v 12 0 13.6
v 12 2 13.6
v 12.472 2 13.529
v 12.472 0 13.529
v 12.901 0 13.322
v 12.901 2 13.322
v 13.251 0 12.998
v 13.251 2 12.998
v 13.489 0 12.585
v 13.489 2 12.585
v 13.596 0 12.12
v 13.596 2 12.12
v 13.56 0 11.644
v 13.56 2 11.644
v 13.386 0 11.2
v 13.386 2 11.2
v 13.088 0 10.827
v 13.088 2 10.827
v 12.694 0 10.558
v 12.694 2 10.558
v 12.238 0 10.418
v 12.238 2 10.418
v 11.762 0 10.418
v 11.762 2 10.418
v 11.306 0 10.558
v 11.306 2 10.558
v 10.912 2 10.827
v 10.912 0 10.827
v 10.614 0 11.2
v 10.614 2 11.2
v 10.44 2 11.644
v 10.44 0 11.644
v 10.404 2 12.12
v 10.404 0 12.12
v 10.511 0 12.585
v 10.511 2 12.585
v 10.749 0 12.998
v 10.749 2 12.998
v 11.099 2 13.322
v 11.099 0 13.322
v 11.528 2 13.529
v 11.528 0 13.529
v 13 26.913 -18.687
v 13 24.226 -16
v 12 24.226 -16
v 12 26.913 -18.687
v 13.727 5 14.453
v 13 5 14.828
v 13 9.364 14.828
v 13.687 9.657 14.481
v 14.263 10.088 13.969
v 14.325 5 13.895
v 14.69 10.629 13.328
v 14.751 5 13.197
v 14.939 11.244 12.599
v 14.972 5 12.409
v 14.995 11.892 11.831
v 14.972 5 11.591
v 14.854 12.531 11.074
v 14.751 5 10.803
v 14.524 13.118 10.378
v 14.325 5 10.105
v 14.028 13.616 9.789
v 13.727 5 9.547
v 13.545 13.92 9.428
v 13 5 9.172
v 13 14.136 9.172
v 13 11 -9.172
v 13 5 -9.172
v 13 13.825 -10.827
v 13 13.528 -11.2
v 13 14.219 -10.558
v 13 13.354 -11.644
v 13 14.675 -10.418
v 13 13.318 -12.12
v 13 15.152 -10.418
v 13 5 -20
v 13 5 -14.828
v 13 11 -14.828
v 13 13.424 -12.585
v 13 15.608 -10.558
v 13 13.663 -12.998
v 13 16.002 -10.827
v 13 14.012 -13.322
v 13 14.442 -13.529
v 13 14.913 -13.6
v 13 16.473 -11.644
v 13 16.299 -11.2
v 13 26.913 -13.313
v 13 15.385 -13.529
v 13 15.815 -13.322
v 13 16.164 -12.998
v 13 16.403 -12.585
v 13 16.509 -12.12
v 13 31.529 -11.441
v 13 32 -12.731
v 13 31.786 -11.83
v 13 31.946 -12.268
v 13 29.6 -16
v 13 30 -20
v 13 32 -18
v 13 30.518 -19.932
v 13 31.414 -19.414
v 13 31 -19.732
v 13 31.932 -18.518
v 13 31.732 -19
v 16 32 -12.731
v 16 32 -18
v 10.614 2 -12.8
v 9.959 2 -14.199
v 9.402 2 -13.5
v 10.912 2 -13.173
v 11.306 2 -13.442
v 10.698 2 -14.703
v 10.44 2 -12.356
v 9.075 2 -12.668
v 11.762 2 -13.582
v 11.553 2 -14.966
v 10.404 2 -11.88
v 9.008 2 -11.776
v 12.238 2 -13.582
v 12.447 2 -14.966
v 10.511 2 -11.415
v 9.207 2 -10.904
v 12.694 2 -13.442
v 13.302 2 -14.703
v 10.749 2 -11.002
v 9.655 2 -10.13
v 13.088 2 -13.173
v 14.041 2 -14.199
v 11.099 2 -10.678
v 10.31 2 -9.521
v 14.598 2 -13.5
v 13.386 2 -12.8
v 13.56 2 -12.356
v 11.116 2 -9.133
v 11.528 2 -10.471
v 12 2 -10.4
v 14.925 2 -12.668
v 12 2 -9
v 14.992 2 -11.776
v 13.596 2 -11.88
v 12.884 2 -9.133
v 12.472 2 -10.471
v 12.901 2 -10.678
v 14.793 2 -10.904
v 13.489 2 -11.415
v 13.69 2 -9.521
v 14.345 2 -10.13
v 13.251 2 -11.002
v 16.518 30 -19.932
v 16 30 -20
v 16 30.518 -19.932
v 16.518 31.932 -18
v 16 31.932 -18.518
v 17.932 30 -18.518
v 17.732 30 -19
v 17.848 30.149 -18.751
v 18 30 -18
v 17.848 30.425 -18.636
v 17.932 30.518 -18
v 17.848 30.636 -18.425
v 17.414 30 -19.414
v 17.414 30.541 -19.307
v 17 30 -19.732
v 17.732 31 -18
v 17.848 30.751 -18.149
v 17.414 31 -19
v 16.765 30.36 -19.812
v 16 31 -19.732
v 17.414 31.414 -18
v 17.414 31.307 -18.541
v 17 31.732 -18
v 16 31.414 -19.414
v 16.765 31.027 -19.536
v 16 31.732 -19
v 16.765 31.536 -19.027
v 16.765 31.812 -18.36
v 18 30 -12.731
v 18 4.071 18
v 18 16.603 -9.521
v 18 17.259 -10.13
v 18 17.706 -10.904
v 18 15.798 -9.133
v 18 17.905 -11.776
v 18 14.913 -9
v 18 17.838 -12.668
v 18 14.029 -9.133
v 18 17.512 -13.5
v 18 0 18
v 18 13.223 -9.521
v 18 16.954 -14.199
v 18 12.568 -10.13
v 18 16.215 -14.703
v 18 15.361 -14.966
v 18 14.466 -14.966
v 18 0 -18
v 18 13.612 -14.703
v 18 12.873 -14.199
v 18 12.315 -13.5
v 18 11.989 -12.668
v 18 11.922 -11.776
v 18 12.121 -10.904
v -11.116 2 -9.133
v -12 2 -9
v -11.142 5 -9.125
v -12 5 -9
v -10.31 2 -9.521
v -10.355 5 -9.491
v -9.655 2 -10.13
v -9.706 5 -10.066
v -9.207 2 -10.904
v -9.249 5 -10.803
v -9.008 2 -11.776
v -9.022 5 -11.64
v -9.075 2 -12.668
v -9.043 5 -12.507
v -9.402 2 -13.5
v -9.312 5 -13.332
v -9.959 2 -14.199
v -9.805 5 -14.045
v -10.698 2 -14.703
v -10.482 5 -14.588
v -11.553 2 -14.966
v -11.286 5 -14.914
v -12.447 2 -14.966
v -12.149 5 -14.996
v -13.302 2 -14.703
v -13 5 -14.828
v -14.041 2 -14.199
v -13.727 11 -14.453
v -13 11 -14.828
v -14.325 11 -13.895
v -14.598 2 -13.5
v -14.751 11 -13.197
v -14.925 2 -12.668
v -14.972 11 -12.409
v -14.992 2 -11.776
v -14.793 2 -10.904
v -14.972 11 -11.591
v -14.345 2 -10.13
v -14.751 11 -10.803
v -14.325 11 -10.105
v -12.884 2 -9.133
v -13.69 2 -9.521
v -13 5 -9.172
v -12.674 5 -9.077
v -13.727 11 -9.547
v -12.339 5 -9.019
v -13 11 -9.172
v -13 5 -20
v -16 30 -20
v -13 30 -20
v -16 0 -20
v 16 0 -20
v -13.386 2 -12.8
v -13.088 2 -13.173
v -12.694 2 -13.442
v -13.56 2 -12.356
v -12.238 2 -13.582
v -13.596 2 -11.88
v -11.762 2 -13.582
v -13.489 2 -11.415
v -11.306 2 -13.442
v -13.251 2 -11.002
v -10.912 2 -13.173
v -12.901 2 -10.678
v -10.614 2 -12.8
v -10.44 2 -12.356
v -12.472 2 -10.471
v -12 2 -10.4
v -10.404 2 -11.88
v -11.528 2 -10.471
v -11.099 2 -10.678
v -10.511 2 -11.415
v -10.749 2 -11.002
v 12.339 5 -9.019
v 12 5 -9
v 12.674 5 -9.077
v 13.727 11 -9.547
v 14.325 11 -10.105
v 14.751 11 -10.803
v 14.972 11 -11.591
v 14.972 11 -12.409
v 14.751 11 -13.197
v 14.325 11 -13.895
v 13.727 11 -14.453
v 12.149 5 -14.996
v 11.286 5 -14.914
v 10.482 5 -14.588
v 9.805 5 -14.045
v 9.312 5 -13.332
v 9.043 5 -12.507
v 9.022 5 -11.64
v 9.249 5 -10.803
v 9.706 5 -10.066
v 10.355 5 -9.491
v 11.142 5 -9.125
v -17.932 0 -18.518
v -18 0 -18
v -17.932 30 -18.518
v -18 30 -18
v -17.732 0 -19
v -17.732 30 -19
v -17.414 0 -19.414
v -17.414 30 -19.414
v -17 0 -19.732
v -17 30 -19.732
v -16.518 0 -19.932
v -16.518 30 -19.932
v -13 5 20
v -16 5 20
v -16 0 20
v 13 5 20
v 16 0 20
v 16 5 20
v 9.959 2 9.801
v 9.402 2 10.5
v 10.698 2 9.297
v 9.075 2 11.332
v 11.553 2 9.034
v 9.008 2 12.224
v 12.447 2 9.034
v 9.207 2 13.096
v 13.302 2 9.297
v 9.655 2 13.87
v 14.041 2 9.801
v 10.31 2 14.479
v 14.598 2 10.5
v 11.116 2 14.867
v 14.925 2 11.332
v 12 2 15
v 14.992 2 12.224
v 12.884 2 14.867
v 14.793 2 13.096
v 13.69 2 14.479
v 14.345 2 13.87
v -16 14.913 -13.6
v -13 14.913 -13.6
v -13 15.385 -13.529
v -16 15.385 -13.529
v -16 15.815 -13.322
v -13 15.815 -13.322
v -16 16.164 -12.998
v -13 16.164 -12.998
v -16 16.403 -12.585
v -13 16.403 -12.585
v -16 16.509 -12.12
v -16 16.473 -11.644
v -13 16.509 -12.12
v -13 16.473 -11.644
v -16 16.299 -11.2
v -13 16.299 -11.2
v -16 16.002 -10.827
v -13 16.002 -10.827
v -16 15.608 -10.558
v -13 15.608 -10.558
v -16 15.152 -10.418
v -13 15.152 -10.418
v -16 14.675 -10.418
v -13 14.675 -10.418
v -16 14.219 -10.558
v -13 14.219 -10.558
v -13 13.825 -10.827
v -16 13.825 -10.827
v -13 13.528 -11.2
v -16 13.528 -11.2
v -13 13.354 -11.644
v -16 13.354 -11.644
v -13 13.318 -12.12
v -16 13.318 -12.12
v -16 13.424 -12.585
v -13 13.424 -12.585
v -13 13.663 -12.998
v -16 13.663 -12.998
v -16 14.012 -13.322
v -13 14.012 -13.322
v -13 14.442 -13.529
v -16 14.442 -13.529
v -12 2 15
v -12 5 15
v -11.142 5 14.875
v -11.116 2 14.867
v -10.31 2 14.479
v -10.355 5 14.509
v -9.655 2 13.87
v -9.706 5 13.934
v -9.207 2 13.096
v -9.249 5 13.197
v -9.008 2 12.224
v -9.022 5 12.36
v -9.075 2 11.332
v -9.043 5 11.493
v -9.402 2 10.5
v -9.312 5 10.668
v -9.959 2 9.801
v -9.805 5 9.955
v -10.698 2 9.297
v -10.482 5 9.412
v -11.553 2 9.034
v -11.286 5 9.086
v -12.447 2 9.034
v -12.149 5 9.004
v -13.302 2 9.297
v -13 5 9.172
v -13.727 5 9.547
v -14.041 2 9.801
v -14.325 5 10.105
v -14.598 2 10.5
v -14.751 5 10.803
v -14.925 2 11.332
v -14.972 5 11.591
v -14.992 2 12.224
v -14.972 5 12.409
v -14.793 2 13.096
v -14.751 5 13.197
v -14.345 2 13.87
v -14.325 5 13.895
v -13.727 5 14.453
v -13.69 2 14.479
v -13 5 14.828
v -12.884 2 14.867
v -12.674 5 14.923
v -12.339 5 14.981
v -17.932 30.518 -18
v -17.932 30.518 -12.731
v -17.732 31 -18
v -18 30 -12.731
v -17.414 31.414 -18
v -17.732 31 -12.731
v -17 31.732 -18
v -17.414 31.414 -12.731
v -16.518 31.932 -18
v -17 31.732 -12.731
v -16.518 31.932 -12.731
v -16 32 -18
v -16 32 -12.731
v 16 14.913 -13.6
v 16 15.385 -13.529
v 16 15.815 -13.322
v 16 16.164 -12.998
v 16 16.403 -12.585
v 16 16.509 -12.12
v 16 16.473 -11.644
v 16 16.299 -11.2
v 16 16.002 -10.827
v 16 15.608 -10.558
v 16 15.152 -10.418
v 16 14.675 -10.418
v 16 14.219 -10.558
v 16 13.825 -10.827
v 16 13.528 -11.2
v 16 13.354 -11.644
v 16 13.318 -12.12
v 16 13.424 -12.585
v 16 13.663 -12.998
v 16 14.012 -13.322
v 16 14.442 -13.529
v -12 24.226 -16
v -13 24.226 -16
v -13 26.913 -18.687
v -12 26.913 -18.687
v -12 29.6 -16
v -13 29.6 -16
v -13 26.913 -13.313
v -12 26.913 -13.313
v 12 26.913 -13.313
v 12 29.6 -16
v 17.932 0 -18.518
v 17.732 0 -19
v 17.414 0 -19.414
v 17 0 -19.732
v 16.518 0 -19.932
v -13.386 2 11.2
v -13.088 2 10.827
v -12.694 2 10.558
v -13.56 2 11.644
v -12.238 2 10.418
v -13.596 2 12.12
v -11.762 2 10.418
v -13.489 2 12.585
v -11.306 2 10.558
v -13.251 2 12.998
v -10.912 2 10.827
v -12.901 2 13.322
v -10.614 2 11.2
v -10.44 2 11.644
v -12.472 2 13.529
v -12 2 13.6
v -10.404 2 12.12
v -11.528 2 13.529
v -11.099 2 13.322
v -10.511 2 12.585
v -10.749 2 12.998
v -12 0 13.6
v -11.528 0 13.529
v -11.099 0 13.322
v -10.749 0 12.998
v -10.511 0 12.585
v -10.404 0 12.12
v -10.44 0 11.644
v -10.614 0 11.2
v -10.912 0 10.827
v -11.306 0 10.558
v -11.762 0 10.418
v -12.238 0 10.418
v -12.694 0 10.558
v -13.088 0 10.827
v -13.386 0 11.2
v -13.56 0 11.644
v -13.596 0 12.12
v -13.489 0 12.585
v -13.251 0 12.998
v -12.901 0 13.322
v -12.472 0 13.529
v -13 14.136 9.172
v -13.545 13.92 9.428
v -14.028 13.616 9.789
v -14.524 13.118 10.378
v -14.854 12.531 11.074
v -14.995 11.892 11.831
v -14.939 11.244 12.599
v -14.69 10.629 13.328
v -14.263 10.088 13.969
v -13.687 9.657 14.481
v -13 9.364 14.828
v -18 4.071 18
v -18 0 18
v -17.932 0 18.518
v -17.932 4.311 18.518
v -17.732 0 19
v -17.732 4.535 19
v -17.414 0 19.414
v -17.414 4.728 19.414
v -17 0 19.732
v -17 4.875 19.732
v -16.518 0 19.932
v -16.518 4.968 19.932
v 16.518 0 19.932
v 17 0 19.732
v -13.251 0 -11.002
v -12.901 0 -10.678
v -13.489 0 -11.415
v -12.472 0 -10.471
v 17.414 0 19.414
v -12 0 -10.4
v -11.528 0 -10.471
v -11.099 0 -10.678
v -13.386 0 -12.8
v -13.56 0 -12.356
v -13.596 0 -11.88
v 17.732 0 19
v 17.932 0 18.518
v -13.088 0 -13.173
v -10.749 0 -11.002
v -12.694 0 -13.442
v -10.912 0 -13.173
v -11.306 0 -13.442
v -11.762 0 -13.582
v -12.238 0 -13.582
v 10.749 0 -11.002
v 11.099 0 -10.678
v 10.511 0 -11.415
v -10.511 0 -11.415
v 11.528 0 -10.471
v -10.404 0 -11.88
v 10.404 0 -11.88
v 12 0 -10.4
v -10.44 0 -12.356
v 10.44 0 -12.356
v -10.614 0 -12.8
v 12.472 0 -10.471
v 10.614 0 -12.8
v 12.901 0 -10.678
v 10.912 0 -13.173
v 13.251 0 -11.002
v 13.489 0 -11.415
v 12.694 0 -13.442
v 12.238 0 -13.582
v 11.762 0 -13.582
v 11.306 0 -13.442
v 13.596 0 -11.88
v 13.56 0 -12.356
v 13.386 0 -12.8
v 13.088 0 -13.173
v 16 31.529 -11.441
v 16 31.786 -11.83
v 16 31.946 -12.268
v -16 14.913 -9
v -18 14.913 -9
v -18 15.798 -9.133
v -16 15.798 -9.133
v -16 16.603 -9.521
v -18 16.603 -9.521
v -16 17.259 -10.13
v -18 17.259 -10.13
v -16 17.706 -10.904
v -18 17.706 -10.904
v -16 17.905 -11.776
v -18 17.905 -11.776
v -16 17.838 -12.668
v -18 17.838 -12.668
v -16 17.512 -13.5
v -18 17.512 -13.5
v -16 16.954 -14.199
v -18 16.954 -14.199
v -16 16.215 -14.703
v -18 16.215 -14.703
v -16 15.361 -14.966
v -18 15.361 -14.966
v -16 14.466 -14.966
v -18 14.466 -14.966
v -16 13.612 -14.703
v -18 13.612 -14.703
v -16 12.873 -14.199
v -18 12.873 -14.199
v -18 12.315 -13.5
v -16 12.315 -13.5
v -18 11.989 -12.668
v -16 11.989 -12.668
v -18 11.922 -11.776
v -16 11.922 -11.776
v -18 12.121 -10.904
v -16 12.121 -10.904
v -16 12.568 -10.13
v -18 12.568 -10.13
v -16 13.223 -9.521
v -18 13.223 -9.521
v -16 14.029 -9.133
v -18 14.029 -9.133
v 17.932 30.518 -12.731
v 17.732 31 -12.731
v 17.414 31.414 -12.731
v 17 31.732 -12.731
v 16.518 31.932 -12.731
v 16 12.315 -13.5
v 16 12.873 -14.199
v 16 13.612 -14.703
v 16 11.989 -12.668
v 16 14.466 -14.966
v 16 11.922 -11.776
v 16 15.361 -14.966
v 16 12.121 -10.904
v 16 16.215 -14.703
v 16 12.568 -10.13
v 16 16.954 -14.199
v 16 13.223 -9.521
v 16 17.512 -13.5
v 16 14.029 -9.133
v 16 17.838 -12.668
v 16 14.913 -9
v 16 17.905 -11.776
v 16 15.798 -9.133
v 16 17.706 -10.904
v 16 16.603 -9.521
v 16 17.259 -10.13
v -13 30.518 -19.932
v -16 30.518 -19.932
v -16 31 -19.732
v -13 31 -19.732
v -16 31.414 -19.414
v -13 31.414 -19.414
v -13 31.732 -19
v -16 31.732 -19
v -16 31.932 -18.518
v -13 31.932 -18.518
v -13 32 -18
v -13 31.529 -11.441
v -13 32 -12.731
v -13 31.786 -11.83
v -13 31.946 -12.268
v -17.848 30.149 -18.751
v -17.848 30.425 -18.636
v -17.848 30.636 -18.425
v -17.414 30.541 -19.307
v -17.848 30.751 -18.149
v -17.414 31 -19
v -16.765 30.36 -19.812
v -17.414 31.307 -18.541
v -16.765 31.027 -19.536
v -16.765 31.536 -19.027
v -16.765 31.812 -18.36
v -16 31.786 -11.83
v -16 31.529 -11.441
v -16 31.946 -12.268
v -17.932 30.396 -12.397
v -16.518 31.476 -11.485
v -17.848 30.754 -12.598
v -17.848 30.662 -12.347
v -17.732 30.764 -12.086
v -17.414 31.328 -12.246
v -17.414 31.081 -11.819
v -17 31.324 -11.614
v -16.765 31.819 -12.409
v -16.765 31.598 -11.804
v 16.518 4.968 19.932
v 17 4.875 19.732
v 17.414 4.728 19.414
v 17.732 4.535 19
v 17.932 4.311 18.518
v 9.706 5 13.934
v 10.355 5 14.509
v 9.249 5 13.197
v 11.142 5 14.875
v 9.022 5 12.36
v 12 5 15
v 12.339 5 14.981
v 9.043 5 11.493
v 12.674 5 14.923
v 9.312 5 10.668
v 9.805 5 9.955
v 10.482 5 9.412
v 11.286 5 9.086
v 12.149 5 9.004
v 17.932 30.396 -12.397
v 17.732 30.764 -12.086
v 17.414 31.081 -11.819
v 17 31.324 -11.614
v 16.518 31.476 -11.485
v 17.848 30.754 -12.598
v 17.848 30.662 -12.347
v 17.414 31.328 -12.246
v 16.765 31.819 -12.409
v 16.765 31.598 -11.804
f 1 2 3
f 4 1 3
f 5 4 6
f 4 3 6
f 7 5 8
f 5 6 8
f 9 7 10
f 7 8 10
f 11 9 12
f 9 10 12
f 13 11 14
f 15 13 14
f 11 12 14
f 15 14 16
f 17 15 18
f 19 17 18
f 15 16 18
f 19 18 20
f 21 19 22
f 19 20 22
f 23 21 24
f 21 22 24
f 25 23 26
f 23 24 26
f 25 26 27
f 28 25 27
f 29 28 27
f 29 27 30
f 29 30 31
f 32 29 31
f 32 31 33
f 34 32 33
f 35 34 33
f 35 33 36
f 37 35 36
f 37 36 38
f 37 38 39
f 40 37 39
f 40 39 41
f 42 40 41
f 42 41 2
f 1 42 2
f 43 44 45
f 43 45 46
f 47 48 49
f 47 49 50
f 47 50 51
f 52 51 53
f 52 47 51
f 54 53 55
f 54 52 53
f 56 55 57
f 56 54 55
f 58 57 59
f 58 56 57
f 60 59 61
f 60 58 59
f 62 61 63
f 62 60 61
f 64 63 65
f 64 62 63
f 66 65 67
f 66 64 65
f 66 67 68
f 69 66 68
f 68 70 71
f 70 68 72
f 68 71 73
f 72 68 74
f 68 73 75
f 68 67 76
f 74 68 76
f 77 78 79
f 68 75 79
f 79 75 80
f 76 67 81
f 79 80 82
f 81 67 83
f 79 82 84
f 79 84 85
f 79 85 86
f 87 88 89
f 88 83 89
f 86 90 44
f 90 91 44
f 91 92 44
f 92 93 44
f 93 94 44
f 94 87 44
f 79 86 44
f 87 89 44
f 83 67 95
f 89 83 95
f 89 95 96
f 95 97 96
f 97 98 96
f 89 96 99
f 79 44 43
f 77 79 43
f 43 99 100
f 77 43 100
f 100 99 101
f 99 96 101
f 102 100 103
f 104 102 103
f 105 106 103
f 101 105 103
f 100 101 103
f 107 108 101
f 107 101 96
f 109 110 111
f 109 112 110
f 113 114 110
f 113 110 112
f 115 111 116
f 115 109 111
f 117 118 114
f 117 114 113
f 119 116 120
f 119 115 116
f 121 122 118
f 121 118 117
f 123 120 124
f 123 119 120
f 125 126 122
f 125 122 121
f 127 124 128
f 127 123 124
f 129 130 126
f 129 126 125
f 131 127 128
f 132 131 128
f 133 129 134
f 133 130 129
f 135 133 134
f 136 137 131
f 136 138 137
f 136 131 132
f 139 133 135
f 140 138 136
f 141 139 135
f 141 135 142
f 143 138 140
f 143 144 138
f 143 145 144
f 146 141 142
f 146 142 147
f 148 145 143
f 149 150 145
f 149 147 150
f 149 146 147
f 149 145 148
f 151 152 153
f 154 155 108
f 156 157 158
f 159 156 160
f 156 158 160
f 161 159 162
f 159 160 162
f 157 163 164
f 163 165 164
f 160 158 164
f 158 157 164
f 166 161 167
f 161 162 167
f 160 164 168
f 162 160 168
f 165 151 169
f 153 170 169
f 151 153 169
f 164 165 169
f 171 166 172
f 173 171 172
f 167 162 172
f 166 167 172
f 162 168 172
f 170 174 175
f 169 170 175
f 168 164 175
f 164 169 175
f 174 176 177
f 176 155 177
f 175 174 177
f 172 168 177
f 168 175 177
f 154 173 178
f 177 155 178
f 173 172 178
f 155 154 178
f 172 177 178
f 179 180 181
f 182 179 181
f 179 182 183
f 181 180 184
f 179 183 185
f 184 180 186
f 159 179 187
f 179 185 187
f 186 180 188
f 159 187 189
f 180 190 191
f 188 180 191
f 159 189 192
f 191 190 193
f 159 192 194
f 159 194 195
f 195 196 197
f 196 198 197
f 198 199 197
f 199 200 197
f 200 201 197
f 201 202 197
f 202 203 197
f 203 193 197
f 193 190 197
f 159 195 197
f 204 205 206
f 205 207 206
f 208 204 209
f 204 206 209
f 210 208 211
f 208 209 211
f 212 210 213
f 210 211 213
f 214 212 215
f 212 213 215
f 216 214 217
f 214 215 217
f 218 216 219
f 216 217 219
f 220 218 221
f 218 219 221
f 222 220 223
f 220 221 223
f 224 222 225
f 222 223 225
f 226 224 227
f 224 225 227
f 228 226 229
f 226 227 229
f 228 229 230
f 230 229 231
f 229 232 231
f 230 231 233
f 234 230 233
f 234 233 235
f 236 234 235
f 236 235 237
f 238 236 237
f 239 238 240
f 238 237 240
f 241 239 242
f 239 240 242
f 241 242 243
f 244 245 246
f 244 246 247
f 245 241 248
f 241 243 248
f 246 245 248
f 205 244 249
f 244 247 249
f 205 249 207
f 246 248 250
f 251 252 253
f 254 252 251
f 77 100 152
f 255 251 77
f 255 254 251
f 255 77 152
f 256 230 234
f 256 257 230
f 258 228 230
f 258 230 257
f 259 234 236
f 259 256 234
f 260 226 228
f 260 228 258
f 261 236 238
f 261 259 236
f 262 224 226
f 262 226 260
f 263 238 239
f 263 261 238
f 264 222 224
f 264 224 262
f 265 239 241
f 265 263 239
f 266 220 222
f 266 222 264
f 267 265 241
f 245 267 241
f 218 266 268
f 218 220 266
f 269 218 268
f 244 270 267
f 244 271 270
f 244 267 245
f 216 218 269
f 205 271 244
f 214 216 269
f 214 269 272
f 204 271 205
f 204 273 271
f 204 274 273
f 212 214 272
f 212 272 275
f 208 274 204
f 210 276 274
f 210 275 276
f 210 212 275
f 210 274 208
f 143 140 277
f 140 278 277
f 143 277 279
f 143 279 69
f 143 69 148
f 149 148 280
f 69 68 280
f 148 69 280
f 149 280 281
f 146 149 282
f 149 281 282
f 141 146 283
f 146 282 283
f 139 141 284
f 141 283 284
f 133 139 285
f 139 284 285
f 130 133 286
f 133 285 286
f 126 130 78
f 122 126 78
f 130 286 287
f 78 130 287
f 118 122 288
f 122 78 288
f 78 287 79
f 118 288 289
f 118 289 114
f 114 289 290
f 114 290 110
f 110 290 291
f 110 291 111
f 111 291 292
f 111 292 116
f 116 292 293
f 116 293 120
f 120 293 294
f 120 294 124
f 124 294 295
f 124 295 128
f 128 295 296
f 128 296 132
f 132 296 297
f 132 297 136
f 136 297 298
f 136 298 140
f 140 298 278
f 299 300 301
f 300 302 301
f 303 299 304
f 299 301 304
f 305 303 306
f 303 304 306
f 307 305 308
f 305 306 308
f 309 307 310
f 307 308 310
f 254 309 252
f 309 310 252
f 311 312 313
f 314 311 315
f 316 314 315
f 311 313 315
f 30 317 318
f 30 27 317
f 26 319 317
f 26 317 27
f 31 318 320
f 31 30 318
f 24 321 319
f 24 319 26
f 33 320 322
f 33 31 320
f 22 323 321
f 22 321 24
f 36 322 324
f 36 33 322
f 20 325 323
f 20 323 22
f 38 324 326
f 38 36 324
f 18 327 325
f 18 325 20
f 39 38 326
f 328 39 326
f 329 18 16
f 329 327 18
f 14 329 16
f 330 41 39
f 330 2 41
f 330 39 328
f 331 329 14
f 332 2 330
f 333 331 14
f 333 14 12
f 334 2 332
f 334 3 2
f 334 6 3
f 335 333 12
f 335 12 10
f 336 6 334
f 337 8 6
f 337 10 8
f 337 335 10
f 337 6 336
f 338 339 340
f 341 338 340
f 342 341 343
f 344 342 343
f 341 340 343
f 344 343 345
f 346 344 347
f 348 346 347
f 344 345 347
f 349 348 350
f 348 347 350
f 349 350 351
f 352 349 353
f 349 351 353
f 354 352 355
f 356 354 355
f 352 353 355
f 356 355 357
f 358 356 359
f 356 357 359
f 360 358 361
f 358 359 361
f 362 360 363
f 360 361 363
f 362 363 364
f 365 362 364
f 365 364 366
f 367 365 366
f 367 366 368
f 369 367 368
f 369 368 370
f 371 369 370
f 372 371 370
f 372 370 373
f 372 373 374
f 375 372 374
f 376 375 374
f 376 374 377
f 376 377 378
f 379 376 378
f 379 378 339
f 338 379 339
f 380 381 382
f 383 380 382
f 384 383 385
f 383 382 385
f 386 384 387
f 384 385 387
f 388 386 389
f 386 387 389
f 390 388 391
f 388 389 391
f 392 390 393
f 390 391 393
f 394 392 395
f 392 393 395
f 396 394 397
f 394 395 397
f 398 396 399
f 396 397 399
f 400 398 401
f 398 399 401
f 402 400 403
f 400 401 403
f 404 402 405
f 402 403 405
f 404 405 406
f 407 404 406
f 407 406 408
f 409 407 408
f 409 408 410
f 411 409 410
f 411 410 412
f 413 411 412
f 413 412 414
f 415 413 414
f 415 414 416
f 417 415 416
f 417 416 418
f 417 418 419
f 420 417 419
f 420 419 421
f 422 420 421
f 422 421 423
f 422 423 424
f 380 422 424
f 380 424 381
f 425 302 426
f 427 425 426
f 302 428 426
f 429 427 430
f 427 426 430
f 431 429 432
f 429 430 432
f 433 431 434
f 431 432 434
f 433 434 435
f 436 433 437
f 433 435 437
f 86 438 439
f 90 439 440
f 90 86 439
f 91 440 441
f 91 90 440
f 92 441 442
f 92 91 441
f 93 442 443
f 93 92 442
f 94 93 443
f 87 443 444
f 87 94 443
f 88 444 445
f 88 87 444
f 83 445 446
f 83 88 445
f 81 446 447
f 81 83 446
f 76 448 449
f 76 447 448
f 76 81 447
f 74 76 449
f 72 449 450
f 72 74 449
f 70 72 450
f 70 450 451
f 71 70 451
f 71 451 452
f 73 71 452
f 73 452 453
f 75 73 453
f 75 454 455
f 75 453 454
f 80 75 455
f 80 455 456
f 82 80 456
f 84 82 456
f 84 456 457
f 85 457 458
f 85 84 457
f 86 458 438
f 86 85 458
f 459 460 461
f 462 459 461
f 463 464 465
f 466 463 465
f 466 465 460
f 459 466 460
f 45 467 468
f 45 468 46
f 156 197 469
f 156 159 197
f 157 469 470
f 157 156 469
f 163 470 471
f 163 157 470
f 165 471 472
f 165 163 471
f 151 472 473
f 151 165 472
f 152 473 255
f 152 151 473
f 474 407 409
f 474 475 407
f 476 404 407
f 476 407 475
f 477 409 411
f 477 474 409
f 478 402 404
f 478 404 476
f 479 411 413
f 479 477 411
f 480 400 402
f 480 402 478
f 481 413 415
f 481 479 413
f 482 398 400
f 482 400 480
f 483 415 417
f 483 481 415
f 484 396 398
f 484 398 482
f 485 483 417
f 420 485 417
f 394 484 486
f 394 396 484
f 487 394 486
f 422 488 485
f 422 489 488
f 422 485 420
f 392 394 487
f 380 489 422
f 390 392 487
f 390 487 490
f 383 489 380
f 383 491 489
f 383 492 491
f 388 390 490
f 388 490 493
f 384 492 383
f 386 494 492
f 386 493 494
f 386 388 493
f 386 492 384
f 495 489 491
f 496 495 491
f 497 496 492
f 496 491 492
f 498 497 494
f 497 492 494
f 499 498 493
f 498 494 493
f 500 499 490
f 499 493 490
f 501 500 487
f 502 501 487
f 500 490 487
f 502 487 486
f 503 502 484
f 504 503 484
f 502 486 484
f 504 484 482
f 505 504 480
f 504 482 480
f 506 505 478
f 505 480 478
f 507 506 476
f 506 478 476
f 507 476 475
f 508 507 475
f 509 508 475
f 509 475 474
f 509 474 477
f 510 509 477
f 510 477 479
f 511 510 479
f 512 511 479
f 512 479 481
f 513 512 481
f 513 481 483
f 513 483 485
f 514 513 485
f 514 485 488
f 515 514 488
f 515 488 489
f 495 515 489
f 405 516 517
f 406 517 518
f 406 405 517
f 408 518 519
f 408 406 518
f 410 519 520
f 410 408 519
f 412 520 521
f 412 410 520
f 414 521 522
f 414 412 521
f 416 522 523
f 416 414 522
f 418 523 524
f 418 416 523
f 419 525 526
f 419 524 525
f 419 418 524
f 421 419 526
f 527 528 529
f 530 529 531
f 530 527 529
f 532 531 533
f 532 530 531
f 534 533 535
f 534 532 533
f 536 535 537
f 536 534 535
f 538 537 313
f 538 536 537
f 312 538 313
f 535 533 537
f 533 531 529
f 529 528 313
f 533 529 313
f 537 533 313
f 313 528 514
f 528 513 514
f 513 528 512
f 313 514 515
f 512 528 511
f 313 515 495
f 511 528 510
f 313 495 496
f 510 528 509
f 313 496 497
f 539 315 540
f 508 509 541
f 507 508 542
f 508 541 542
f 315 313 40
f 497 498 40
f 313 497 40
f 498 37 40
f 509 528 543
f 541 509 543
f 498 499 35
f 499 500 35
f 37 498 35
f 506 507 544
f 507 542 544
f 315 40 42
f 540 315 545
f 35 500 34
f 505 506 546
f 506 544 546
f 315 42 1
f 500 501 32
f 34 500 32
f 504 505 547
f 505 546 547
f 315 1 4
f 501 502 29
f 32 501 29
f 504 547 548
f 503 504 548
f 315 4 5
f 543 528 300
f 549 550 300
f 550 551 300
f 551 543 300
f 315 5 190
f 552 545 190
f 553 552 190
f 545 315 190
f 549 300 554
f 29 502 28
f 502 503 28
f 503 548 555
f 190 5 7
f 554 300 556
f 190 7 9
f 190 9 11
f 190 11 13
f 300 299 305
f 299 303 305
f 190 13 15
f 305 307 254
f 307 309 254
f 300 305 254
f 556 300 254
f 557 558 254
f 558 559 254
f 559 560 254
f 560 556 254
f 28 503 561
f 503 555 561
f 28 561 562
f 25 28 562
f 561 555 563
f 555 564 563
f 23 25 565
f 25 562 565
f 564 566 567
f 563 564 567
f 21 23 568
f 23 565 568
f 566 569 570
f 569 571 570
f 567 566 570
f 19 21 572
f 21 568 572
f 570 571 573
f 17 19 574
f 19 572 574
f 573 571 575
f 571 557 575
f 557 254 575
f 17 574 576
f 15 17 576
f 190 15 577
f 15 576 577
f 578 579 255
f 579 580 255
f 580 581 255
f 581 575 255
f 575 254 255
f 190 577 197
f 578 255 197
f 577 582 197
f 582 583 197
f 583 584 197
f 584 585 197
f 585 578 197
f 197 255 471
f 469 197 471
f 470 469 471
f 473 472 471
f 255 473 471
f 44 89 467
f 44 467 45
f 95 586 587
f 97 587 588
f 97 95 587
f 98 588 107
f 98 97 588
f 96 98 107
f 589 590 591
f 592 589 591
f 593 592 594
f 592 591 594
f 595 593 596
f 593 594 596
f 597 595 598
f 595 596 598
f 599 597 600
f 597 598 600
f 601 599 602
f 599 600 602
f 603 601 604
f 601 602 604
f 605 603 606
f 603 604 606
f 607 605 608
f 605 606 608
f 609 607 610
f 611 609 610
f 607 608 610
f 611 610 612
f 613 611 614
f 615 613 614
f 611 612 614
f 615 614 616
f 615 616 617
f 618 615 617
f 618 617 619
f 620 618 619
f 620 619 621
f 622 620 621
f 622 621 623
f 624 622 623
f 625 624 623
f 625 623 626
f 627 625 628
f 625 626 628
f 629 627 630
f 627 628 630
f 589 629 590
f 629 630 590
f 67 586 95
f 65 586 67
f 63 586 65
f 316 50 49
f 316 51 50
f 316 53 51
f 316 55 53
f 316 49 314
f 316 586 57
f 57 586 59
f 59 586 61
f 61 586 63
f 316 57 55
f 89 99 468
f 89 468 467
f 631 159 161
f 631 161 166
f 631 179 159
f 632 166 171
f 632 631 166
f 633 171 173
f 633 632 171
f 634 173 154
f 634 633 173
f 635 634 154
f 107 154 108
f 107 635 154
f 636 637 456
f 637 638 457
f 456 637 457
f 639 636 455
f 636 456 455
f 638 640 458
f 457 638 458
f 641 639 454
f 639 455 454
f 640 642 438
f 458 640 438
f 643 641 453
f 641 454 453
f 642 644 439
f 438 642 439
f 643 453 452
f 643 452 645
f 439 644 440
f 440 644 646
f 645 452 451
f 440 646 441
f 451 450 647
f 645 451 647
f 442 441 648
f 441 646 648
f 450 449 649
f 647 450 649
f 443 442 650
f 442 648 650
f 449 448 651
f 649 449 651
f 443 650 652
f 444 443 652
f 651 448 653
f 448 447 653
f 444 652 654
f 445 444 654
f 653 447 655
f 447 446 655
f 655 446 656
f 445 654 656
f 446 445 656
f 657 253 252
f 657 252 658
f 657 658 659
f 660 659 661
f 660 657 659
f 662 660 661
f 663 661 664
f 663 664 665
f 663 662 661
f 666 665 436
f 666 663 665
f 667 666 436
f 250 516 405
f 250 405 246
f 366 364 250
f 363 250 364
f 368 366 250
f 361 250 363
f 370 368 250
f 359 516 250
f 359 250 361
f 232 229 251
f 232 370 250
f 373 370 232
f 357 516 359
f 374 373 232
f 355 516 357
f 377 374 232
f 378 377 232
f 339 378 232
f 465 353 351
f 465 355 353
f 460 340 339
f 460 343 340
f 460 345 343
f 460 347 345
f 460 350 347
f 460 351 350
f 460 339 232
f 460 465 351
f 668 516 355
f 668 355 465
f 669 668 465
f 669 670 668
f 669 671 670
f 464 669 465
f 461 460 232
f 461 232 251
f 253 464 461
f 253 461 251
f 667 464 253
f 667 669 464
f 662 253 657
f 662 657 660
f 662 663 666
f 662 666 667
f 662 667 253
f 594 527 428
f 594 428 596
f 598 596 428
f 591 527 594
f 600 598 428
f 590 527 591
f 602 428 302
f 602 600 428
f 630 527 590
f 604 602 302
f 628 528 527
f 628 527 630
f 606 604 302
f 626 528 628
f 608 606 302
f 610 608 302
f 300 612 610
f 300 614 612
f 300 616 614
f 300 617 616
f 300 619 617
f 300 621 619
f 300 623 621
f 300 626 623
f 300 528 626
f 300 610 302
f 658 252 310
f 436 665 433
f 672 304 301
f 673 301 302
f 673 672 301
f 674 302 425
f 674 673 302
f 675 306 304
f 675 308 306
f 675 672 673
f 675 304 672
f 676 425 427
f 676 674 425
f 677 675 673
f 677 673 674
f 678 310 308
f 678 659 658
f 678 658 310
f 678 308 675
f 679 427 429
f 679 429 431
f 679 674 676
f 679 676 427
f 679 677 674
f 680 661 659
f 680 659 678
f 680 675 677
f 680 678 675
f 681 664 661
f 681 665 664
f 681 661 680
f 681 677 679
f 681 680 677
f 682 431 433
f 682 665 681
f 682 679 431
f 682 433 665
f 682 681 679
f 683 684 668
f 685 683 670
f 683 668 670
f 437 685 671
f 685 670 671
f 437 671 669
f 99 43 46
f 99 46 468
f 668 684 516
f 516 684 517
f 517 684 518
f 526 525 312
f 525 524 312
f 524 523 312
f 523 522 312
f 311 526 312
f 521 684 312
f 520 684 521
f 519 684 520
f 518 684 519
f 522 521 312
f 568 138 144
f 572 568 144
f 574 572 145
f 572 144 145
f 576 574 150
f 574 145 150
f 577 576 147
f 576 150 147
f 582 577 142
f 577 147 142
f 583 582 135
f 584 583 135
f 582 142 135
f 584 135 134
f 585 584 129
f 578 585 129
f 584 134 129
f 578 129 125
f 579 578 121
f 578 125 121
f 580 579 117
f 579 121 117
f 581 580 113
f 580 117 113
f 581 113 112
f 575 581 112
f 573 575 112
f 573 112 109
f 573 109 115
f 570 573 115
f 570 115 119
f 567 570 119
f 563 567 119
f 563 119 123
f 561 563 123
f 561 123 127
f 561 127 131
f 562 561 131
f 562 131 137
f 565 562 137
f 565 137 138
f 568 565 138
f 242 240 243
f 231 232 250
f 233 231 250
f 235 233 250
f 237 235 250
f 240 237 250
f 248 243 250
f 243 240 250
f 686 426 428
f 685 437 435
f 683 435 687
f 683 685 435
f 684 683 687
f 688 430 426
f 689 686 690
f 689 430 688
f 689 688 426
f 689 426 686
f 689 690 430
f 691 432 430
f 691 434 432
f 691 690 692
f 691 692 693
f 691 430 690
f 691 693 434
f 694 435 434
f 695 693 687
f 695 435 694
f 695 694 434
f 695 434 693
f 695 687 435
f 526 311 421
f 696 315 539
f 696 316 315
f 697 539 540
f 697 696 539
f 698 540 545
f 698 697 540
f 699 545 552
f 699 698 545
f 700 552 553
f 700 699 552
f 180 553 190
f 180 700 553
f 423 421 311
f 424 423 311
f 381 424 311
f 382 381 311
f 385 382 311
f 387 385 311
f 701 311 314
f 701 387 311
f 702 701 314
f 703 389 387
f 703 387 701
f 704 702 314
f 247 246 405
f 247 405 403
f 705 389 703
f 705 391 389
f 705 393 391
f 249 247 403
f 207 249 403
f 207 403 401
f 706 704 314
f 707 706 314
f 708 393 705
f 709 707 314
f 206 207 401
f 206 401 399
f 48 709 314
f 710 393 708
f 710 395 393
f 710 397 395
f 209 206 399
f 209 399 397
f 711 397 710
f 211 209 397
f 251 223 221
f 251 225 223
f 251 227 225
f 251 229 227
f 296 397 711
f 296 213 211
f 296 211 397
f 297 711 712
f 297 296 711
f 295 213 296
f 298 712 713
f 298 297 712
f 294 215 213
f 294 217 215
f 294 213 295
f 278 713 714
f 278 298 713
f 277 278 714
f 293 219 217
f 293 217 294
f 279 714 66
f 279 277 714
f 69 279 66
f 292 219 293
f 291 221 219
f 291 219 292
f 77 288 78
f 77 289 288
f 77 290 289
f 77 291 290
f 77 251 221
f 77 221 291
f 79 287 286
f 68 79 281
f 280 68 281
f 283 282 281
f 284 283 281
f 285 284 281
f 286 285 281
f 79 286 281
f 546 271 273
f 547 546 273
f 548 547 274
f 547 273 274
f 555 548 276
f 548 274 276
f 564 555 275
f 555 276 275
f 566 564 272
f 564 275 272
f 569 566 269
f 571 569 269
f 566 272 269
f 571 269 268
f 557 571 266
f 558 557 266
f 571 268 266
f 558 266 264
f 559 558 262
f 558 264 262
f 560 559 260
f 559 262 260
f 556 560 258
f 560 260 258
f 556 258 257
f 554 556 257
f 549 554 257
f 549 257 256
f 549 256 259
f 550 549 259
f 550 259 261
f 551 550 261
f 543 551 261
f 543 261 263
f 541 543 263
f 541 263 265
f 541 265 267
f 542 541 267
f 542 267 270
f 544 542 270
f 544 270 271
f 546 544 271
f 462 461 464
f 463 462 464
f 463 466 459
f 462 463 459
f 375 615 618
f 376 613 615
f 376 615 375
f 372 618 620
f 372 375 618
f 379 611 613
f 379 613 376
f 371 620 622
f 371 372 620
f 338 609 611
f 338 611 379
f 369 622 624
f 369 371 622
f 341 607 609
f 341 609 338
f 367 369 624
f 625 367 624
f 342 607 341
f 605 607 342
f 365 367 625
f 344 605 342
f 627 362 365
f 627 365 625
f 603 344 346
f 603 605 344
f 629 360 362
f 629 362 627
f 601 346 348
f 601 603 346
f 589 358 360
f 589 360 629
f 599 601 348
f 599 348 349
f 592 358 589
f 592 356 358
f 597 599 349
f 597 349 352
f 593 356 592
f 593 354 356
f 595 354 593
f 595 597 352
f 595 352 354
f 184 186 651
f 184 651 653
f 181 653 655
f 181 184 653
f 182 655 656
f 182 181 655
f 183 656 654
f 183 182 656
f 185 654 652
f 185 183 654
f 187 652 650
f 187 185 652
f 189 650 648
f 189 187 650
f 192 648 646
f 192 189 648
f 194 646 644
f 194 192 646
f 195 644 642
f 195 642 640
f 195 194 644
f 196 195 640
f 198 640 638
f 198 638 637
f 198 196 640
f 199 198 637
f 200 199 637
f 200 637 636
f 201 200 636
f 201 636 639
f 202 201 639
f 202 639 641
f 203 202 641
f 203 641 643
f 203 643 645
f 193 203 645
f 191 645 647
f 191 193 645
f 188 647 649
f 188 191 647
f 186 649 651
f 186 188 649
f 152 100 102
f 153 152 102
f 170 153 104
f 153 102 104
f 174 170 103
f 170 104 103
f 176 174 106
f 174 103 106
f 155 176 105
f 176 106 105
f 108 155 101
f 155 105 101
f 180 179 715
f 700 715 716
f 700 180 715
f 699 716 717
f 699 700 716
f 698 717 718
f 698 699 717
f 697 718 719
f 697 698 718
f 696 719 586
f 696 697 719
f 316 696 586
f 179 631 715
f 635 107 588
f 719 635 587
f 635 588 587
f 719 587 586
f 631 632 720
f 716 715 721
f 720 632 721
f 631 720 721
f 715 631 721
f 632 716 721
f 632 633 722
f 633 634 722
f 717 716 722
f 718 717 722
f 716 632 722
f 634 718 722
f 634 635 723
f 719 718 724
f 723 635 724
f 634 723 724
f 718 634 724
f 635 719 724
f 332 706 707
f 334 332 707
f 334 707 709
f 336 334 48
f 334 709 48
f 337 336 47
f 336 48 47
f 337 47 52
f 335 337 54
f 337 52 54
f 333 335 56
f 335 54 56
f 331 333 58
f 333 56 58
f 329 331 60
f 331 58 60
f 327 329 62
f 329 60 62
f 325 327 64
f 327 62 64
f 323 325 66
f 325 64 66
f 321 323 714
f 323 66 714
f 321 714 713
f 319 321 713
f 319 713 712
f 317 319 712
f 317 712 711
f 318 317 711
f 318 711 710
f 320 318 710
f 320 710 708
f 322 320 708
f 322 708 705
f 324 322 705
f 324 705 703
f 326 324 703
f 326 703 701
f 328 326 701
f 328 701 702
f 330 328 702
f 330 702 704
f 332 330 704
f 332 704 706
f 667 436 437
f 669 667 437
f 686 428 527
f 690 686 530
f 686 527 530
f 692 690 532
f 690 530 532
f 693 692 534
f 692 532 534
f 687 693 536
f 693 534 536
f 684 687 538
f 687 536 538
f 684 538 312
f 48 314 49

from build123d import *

# Parameters (mm, degrees)
SKETCH1_W       = 36
SKETCH1_H       = 40
EXTRUDE1_DEPTH  = 5
EXTRUDE2_DEPTH  = 5
EXTRUDE3_DEPTH  = 5
SKETCH4_R       = 3
EXTRUDE4_DEPTH  = 3
SKETCH5_R       = 1.6
EXTRUDE5_DEPTH  = 3
EXTRUDE6_START  = 6
SKETCH6_R       = 3
EXTRUDE6_DEPTH  = 6
FILLET1_R       = 2
EXTRUDE7_DEPTH  = 1
SKETCH9_R       = 1.6
EXTRUDE8_DEPTH  = 49.836461788
SKETCH10_R      = 3
EXTRUDE9_DEPTH  = 2
SKETCH11_R      = 3
EXTRUDE10_DEPTH = 39.118237105
FILLET2_R       = 2


with BuildPart() as part:
    # Sketch1 → Extrude1 (new body)
    with BuildSketch(Plane(origin=(0, 0, 0), x_dir=(1, 0, 0), z_dir=(0, 1, 0))):
        Rectangle(SKETCH1_W, SKETCH1_H)
    extrude(amount=EXTRUDE1_DEPTH)

    # Sketch2 → Extrude2 (add)
    with BuildSketch(Plane.ZY.offset(18)):
        Polygon((-20, 0), (-20, 32), (-12, 32), (20, 5), (20, 0), align=None)
    extrude(amount=-EXTRUDE2_DEPTH)

    # Sketch3 → Extrude3 (add)
    with BuildSketch(Plane(origin=(18, 0, 0), x_dir=(0, 0, -1), z_dir=(1, 0, 0))):
        Polygon((20, 0), (20, 32), (12, 32), (-20, 5), (-20, 0), align=None)
    extrude(amount=-EXTRUDE3_DEPTH)

    # Sketch4 → Extrude4 (cut)
    with BuildSketch(Plane(origin=(0, 5, 0), x_dir=(1, 0, 0), z_dir=(0, 1, 0))):
        with Locations(Location((-12, 12, 0), (0, 0, 270))):
            Circle(SKETCH4_R)
        with Locations(Location((-12, -12, 0), (0, 0, 270))):
            Circle(SKETCH4_R)
        with Locations(Location((12, 12, 0), (0, 0, 270))):
            Circle(SKETCH4_R)
        with Locations(Location((12, -12, 0), (0, 0, 270))):
            Circle(SKETCH4_R)
    extrude(amount=-EXTRUDE4_DEPTH, mode=Mode.SUBTRACT)

    # Sketch5 → Extrude5 (cut)
    with BuildSketch(Plane(origin=(0, 2, 0), x_dir=(1, 0, 0), z_dir=(0, 1, 0))):
        with Locations(Location((-12, 12, 0), (0, 0, 270))):
            Circle(SKETCH5_R)
        with Locations(Location((-12, -12, 0), (0, 0, 270))):
            Circle(SKETCH5_R)
        with Locations(Location((12, -12, 0), (0, 0, 270))):
            Circle(SKETCH5_R)
        with Locations(Location((12, 12, 0), (0, 0, 270))):
            Circle(SKETCH5_R)
    extrude(amount=-EXTRUDE5_DEPTH, mode=Mode.SUBTRACT)

    # Sketch6 → Extrude6 (cut)
    with BuildSketch(Plane(origin=(0, 5, 0), x_dir=(1, 0, 0), z_dir=(0, 1, 0)).offset(EXTRUDE6_START)):
        with Locations(Location((-12, 12, 0), (0, 0, 270))):
            Circle(SKETCH6_R)
        with Locations(Location((12, 12, 0), (0, 0, 270))):
            Circle(SKETCH6_R)
    extrude(amount=-EXTRUDE6_DEPTH, mode=Mode.SUBTRACT)

    # Fillet1
    fillet1_edges = [part.edges().sort_by_distance(p)[0] for p in [
        (-15.5, 32, -20),
        (-15.5, 32, -12),
        (15.5, 32, -20),
        (15.5, 32, -12),
    ]]
    fillet(fillet1_edges, radius=FILLET1_R)

    # Sketch7 → Extrude7 (add)
    with BuildSketch(Plane(origin=(-13, 0, 0), x_dir=(0, 0, -1), z_dir=(1, 0, 0))):
        Polygon((16, 29.600452322), (13.312994231, 26.913446553), (16, 24.226440785), (18.687005769, 26.913446553), align=None)
    extrude7 = extrude(amount=EXTRUDE7_DEPTH)

    # Sketch9 → Extrude8 (cut, through all)
    with BuildSketch(Plane(origin=(-13, 0, 0), x_dir=(0, 0, -1), z_dir=(1, 0, 0))):
        with Locations((12, 14.913446553)):
            Circle(SKETCH9_R)
    extrude8 = extrude(amount=-EXTRUDE8_DEPTH, mode=Mode.SUBTRACT)

    # Sketch10 → Extrude9 (cut)
    with BuildSketch(Plane.ZY.offset(18)):
        with Locations((-12, 14.913446553)):
            Circle(SKETCH10_R)
    extrude9 = extrude(amount=-EXTRUDE9_DEPTH, mode=Mode.SUBTRACT)

    # Mirror2: Extrude7, Extrude8, Extrude9 across plane
    add(extrude7.mirror(Plane(origin=(0, 0, 0), x_dir=(0, 0, 1), z_dir=(1, 0, 0))))
    add(extrude8.mirror(Plane(origin=(0, 0, 0), x_dir=(0, 0, 1), z_dir=(1, 0, 0))), mode=Mode.SUBTRACT)
    add(extrude9.mirror(Plane(origin=(0, 0, 0), x_dir=(0, 0, 1), z_dir=(1, 0, 0))), mode=Mode.SUBTRACT)

    # Sketch11 → Extrude10 (cut, through all)
    with BuildSketch(Plane(origin=(0, 5, 0), x_dir=(1, 0, 0), z_dir=(0, 1, 0))):
        with Locations(Location((-12, -12, 0), (0, 0, 270))):
            Circle(SKETCH11_R)
        with Locations(Location((12, -12, 0), (0, 0, 270))):
            Circle(SKETCH11_R)
    extrude(amount=EXTRUDE10_DEPTH, mode=Mode.SUBTRACT)

    # Fillet2
    fillet2_edges = [part.edges().sort_by_distance(p)[0] for p in [
        (-18, 32, -15.365512697),
        (-18, 15, -20),
        (-18, 31.414213562, -19.414213562),
        (-18, 31.87845228, -12.044427235),
        (18, 32, -15.365512697),
        (18, 15, -20),
        (18, 18.264291484, 4.279358242),
        (18, 31.414213562, -19.414213562),
        (18, 31.87845228, -12.044427235),
        (-18, 18.264291484, 4.279358242),
        (18, 2.5, 20),
        (-18, 2.5, 20),
    ]]
    fillet(fillet2_edges, radius=FILLET2_R)


solid = part.part
